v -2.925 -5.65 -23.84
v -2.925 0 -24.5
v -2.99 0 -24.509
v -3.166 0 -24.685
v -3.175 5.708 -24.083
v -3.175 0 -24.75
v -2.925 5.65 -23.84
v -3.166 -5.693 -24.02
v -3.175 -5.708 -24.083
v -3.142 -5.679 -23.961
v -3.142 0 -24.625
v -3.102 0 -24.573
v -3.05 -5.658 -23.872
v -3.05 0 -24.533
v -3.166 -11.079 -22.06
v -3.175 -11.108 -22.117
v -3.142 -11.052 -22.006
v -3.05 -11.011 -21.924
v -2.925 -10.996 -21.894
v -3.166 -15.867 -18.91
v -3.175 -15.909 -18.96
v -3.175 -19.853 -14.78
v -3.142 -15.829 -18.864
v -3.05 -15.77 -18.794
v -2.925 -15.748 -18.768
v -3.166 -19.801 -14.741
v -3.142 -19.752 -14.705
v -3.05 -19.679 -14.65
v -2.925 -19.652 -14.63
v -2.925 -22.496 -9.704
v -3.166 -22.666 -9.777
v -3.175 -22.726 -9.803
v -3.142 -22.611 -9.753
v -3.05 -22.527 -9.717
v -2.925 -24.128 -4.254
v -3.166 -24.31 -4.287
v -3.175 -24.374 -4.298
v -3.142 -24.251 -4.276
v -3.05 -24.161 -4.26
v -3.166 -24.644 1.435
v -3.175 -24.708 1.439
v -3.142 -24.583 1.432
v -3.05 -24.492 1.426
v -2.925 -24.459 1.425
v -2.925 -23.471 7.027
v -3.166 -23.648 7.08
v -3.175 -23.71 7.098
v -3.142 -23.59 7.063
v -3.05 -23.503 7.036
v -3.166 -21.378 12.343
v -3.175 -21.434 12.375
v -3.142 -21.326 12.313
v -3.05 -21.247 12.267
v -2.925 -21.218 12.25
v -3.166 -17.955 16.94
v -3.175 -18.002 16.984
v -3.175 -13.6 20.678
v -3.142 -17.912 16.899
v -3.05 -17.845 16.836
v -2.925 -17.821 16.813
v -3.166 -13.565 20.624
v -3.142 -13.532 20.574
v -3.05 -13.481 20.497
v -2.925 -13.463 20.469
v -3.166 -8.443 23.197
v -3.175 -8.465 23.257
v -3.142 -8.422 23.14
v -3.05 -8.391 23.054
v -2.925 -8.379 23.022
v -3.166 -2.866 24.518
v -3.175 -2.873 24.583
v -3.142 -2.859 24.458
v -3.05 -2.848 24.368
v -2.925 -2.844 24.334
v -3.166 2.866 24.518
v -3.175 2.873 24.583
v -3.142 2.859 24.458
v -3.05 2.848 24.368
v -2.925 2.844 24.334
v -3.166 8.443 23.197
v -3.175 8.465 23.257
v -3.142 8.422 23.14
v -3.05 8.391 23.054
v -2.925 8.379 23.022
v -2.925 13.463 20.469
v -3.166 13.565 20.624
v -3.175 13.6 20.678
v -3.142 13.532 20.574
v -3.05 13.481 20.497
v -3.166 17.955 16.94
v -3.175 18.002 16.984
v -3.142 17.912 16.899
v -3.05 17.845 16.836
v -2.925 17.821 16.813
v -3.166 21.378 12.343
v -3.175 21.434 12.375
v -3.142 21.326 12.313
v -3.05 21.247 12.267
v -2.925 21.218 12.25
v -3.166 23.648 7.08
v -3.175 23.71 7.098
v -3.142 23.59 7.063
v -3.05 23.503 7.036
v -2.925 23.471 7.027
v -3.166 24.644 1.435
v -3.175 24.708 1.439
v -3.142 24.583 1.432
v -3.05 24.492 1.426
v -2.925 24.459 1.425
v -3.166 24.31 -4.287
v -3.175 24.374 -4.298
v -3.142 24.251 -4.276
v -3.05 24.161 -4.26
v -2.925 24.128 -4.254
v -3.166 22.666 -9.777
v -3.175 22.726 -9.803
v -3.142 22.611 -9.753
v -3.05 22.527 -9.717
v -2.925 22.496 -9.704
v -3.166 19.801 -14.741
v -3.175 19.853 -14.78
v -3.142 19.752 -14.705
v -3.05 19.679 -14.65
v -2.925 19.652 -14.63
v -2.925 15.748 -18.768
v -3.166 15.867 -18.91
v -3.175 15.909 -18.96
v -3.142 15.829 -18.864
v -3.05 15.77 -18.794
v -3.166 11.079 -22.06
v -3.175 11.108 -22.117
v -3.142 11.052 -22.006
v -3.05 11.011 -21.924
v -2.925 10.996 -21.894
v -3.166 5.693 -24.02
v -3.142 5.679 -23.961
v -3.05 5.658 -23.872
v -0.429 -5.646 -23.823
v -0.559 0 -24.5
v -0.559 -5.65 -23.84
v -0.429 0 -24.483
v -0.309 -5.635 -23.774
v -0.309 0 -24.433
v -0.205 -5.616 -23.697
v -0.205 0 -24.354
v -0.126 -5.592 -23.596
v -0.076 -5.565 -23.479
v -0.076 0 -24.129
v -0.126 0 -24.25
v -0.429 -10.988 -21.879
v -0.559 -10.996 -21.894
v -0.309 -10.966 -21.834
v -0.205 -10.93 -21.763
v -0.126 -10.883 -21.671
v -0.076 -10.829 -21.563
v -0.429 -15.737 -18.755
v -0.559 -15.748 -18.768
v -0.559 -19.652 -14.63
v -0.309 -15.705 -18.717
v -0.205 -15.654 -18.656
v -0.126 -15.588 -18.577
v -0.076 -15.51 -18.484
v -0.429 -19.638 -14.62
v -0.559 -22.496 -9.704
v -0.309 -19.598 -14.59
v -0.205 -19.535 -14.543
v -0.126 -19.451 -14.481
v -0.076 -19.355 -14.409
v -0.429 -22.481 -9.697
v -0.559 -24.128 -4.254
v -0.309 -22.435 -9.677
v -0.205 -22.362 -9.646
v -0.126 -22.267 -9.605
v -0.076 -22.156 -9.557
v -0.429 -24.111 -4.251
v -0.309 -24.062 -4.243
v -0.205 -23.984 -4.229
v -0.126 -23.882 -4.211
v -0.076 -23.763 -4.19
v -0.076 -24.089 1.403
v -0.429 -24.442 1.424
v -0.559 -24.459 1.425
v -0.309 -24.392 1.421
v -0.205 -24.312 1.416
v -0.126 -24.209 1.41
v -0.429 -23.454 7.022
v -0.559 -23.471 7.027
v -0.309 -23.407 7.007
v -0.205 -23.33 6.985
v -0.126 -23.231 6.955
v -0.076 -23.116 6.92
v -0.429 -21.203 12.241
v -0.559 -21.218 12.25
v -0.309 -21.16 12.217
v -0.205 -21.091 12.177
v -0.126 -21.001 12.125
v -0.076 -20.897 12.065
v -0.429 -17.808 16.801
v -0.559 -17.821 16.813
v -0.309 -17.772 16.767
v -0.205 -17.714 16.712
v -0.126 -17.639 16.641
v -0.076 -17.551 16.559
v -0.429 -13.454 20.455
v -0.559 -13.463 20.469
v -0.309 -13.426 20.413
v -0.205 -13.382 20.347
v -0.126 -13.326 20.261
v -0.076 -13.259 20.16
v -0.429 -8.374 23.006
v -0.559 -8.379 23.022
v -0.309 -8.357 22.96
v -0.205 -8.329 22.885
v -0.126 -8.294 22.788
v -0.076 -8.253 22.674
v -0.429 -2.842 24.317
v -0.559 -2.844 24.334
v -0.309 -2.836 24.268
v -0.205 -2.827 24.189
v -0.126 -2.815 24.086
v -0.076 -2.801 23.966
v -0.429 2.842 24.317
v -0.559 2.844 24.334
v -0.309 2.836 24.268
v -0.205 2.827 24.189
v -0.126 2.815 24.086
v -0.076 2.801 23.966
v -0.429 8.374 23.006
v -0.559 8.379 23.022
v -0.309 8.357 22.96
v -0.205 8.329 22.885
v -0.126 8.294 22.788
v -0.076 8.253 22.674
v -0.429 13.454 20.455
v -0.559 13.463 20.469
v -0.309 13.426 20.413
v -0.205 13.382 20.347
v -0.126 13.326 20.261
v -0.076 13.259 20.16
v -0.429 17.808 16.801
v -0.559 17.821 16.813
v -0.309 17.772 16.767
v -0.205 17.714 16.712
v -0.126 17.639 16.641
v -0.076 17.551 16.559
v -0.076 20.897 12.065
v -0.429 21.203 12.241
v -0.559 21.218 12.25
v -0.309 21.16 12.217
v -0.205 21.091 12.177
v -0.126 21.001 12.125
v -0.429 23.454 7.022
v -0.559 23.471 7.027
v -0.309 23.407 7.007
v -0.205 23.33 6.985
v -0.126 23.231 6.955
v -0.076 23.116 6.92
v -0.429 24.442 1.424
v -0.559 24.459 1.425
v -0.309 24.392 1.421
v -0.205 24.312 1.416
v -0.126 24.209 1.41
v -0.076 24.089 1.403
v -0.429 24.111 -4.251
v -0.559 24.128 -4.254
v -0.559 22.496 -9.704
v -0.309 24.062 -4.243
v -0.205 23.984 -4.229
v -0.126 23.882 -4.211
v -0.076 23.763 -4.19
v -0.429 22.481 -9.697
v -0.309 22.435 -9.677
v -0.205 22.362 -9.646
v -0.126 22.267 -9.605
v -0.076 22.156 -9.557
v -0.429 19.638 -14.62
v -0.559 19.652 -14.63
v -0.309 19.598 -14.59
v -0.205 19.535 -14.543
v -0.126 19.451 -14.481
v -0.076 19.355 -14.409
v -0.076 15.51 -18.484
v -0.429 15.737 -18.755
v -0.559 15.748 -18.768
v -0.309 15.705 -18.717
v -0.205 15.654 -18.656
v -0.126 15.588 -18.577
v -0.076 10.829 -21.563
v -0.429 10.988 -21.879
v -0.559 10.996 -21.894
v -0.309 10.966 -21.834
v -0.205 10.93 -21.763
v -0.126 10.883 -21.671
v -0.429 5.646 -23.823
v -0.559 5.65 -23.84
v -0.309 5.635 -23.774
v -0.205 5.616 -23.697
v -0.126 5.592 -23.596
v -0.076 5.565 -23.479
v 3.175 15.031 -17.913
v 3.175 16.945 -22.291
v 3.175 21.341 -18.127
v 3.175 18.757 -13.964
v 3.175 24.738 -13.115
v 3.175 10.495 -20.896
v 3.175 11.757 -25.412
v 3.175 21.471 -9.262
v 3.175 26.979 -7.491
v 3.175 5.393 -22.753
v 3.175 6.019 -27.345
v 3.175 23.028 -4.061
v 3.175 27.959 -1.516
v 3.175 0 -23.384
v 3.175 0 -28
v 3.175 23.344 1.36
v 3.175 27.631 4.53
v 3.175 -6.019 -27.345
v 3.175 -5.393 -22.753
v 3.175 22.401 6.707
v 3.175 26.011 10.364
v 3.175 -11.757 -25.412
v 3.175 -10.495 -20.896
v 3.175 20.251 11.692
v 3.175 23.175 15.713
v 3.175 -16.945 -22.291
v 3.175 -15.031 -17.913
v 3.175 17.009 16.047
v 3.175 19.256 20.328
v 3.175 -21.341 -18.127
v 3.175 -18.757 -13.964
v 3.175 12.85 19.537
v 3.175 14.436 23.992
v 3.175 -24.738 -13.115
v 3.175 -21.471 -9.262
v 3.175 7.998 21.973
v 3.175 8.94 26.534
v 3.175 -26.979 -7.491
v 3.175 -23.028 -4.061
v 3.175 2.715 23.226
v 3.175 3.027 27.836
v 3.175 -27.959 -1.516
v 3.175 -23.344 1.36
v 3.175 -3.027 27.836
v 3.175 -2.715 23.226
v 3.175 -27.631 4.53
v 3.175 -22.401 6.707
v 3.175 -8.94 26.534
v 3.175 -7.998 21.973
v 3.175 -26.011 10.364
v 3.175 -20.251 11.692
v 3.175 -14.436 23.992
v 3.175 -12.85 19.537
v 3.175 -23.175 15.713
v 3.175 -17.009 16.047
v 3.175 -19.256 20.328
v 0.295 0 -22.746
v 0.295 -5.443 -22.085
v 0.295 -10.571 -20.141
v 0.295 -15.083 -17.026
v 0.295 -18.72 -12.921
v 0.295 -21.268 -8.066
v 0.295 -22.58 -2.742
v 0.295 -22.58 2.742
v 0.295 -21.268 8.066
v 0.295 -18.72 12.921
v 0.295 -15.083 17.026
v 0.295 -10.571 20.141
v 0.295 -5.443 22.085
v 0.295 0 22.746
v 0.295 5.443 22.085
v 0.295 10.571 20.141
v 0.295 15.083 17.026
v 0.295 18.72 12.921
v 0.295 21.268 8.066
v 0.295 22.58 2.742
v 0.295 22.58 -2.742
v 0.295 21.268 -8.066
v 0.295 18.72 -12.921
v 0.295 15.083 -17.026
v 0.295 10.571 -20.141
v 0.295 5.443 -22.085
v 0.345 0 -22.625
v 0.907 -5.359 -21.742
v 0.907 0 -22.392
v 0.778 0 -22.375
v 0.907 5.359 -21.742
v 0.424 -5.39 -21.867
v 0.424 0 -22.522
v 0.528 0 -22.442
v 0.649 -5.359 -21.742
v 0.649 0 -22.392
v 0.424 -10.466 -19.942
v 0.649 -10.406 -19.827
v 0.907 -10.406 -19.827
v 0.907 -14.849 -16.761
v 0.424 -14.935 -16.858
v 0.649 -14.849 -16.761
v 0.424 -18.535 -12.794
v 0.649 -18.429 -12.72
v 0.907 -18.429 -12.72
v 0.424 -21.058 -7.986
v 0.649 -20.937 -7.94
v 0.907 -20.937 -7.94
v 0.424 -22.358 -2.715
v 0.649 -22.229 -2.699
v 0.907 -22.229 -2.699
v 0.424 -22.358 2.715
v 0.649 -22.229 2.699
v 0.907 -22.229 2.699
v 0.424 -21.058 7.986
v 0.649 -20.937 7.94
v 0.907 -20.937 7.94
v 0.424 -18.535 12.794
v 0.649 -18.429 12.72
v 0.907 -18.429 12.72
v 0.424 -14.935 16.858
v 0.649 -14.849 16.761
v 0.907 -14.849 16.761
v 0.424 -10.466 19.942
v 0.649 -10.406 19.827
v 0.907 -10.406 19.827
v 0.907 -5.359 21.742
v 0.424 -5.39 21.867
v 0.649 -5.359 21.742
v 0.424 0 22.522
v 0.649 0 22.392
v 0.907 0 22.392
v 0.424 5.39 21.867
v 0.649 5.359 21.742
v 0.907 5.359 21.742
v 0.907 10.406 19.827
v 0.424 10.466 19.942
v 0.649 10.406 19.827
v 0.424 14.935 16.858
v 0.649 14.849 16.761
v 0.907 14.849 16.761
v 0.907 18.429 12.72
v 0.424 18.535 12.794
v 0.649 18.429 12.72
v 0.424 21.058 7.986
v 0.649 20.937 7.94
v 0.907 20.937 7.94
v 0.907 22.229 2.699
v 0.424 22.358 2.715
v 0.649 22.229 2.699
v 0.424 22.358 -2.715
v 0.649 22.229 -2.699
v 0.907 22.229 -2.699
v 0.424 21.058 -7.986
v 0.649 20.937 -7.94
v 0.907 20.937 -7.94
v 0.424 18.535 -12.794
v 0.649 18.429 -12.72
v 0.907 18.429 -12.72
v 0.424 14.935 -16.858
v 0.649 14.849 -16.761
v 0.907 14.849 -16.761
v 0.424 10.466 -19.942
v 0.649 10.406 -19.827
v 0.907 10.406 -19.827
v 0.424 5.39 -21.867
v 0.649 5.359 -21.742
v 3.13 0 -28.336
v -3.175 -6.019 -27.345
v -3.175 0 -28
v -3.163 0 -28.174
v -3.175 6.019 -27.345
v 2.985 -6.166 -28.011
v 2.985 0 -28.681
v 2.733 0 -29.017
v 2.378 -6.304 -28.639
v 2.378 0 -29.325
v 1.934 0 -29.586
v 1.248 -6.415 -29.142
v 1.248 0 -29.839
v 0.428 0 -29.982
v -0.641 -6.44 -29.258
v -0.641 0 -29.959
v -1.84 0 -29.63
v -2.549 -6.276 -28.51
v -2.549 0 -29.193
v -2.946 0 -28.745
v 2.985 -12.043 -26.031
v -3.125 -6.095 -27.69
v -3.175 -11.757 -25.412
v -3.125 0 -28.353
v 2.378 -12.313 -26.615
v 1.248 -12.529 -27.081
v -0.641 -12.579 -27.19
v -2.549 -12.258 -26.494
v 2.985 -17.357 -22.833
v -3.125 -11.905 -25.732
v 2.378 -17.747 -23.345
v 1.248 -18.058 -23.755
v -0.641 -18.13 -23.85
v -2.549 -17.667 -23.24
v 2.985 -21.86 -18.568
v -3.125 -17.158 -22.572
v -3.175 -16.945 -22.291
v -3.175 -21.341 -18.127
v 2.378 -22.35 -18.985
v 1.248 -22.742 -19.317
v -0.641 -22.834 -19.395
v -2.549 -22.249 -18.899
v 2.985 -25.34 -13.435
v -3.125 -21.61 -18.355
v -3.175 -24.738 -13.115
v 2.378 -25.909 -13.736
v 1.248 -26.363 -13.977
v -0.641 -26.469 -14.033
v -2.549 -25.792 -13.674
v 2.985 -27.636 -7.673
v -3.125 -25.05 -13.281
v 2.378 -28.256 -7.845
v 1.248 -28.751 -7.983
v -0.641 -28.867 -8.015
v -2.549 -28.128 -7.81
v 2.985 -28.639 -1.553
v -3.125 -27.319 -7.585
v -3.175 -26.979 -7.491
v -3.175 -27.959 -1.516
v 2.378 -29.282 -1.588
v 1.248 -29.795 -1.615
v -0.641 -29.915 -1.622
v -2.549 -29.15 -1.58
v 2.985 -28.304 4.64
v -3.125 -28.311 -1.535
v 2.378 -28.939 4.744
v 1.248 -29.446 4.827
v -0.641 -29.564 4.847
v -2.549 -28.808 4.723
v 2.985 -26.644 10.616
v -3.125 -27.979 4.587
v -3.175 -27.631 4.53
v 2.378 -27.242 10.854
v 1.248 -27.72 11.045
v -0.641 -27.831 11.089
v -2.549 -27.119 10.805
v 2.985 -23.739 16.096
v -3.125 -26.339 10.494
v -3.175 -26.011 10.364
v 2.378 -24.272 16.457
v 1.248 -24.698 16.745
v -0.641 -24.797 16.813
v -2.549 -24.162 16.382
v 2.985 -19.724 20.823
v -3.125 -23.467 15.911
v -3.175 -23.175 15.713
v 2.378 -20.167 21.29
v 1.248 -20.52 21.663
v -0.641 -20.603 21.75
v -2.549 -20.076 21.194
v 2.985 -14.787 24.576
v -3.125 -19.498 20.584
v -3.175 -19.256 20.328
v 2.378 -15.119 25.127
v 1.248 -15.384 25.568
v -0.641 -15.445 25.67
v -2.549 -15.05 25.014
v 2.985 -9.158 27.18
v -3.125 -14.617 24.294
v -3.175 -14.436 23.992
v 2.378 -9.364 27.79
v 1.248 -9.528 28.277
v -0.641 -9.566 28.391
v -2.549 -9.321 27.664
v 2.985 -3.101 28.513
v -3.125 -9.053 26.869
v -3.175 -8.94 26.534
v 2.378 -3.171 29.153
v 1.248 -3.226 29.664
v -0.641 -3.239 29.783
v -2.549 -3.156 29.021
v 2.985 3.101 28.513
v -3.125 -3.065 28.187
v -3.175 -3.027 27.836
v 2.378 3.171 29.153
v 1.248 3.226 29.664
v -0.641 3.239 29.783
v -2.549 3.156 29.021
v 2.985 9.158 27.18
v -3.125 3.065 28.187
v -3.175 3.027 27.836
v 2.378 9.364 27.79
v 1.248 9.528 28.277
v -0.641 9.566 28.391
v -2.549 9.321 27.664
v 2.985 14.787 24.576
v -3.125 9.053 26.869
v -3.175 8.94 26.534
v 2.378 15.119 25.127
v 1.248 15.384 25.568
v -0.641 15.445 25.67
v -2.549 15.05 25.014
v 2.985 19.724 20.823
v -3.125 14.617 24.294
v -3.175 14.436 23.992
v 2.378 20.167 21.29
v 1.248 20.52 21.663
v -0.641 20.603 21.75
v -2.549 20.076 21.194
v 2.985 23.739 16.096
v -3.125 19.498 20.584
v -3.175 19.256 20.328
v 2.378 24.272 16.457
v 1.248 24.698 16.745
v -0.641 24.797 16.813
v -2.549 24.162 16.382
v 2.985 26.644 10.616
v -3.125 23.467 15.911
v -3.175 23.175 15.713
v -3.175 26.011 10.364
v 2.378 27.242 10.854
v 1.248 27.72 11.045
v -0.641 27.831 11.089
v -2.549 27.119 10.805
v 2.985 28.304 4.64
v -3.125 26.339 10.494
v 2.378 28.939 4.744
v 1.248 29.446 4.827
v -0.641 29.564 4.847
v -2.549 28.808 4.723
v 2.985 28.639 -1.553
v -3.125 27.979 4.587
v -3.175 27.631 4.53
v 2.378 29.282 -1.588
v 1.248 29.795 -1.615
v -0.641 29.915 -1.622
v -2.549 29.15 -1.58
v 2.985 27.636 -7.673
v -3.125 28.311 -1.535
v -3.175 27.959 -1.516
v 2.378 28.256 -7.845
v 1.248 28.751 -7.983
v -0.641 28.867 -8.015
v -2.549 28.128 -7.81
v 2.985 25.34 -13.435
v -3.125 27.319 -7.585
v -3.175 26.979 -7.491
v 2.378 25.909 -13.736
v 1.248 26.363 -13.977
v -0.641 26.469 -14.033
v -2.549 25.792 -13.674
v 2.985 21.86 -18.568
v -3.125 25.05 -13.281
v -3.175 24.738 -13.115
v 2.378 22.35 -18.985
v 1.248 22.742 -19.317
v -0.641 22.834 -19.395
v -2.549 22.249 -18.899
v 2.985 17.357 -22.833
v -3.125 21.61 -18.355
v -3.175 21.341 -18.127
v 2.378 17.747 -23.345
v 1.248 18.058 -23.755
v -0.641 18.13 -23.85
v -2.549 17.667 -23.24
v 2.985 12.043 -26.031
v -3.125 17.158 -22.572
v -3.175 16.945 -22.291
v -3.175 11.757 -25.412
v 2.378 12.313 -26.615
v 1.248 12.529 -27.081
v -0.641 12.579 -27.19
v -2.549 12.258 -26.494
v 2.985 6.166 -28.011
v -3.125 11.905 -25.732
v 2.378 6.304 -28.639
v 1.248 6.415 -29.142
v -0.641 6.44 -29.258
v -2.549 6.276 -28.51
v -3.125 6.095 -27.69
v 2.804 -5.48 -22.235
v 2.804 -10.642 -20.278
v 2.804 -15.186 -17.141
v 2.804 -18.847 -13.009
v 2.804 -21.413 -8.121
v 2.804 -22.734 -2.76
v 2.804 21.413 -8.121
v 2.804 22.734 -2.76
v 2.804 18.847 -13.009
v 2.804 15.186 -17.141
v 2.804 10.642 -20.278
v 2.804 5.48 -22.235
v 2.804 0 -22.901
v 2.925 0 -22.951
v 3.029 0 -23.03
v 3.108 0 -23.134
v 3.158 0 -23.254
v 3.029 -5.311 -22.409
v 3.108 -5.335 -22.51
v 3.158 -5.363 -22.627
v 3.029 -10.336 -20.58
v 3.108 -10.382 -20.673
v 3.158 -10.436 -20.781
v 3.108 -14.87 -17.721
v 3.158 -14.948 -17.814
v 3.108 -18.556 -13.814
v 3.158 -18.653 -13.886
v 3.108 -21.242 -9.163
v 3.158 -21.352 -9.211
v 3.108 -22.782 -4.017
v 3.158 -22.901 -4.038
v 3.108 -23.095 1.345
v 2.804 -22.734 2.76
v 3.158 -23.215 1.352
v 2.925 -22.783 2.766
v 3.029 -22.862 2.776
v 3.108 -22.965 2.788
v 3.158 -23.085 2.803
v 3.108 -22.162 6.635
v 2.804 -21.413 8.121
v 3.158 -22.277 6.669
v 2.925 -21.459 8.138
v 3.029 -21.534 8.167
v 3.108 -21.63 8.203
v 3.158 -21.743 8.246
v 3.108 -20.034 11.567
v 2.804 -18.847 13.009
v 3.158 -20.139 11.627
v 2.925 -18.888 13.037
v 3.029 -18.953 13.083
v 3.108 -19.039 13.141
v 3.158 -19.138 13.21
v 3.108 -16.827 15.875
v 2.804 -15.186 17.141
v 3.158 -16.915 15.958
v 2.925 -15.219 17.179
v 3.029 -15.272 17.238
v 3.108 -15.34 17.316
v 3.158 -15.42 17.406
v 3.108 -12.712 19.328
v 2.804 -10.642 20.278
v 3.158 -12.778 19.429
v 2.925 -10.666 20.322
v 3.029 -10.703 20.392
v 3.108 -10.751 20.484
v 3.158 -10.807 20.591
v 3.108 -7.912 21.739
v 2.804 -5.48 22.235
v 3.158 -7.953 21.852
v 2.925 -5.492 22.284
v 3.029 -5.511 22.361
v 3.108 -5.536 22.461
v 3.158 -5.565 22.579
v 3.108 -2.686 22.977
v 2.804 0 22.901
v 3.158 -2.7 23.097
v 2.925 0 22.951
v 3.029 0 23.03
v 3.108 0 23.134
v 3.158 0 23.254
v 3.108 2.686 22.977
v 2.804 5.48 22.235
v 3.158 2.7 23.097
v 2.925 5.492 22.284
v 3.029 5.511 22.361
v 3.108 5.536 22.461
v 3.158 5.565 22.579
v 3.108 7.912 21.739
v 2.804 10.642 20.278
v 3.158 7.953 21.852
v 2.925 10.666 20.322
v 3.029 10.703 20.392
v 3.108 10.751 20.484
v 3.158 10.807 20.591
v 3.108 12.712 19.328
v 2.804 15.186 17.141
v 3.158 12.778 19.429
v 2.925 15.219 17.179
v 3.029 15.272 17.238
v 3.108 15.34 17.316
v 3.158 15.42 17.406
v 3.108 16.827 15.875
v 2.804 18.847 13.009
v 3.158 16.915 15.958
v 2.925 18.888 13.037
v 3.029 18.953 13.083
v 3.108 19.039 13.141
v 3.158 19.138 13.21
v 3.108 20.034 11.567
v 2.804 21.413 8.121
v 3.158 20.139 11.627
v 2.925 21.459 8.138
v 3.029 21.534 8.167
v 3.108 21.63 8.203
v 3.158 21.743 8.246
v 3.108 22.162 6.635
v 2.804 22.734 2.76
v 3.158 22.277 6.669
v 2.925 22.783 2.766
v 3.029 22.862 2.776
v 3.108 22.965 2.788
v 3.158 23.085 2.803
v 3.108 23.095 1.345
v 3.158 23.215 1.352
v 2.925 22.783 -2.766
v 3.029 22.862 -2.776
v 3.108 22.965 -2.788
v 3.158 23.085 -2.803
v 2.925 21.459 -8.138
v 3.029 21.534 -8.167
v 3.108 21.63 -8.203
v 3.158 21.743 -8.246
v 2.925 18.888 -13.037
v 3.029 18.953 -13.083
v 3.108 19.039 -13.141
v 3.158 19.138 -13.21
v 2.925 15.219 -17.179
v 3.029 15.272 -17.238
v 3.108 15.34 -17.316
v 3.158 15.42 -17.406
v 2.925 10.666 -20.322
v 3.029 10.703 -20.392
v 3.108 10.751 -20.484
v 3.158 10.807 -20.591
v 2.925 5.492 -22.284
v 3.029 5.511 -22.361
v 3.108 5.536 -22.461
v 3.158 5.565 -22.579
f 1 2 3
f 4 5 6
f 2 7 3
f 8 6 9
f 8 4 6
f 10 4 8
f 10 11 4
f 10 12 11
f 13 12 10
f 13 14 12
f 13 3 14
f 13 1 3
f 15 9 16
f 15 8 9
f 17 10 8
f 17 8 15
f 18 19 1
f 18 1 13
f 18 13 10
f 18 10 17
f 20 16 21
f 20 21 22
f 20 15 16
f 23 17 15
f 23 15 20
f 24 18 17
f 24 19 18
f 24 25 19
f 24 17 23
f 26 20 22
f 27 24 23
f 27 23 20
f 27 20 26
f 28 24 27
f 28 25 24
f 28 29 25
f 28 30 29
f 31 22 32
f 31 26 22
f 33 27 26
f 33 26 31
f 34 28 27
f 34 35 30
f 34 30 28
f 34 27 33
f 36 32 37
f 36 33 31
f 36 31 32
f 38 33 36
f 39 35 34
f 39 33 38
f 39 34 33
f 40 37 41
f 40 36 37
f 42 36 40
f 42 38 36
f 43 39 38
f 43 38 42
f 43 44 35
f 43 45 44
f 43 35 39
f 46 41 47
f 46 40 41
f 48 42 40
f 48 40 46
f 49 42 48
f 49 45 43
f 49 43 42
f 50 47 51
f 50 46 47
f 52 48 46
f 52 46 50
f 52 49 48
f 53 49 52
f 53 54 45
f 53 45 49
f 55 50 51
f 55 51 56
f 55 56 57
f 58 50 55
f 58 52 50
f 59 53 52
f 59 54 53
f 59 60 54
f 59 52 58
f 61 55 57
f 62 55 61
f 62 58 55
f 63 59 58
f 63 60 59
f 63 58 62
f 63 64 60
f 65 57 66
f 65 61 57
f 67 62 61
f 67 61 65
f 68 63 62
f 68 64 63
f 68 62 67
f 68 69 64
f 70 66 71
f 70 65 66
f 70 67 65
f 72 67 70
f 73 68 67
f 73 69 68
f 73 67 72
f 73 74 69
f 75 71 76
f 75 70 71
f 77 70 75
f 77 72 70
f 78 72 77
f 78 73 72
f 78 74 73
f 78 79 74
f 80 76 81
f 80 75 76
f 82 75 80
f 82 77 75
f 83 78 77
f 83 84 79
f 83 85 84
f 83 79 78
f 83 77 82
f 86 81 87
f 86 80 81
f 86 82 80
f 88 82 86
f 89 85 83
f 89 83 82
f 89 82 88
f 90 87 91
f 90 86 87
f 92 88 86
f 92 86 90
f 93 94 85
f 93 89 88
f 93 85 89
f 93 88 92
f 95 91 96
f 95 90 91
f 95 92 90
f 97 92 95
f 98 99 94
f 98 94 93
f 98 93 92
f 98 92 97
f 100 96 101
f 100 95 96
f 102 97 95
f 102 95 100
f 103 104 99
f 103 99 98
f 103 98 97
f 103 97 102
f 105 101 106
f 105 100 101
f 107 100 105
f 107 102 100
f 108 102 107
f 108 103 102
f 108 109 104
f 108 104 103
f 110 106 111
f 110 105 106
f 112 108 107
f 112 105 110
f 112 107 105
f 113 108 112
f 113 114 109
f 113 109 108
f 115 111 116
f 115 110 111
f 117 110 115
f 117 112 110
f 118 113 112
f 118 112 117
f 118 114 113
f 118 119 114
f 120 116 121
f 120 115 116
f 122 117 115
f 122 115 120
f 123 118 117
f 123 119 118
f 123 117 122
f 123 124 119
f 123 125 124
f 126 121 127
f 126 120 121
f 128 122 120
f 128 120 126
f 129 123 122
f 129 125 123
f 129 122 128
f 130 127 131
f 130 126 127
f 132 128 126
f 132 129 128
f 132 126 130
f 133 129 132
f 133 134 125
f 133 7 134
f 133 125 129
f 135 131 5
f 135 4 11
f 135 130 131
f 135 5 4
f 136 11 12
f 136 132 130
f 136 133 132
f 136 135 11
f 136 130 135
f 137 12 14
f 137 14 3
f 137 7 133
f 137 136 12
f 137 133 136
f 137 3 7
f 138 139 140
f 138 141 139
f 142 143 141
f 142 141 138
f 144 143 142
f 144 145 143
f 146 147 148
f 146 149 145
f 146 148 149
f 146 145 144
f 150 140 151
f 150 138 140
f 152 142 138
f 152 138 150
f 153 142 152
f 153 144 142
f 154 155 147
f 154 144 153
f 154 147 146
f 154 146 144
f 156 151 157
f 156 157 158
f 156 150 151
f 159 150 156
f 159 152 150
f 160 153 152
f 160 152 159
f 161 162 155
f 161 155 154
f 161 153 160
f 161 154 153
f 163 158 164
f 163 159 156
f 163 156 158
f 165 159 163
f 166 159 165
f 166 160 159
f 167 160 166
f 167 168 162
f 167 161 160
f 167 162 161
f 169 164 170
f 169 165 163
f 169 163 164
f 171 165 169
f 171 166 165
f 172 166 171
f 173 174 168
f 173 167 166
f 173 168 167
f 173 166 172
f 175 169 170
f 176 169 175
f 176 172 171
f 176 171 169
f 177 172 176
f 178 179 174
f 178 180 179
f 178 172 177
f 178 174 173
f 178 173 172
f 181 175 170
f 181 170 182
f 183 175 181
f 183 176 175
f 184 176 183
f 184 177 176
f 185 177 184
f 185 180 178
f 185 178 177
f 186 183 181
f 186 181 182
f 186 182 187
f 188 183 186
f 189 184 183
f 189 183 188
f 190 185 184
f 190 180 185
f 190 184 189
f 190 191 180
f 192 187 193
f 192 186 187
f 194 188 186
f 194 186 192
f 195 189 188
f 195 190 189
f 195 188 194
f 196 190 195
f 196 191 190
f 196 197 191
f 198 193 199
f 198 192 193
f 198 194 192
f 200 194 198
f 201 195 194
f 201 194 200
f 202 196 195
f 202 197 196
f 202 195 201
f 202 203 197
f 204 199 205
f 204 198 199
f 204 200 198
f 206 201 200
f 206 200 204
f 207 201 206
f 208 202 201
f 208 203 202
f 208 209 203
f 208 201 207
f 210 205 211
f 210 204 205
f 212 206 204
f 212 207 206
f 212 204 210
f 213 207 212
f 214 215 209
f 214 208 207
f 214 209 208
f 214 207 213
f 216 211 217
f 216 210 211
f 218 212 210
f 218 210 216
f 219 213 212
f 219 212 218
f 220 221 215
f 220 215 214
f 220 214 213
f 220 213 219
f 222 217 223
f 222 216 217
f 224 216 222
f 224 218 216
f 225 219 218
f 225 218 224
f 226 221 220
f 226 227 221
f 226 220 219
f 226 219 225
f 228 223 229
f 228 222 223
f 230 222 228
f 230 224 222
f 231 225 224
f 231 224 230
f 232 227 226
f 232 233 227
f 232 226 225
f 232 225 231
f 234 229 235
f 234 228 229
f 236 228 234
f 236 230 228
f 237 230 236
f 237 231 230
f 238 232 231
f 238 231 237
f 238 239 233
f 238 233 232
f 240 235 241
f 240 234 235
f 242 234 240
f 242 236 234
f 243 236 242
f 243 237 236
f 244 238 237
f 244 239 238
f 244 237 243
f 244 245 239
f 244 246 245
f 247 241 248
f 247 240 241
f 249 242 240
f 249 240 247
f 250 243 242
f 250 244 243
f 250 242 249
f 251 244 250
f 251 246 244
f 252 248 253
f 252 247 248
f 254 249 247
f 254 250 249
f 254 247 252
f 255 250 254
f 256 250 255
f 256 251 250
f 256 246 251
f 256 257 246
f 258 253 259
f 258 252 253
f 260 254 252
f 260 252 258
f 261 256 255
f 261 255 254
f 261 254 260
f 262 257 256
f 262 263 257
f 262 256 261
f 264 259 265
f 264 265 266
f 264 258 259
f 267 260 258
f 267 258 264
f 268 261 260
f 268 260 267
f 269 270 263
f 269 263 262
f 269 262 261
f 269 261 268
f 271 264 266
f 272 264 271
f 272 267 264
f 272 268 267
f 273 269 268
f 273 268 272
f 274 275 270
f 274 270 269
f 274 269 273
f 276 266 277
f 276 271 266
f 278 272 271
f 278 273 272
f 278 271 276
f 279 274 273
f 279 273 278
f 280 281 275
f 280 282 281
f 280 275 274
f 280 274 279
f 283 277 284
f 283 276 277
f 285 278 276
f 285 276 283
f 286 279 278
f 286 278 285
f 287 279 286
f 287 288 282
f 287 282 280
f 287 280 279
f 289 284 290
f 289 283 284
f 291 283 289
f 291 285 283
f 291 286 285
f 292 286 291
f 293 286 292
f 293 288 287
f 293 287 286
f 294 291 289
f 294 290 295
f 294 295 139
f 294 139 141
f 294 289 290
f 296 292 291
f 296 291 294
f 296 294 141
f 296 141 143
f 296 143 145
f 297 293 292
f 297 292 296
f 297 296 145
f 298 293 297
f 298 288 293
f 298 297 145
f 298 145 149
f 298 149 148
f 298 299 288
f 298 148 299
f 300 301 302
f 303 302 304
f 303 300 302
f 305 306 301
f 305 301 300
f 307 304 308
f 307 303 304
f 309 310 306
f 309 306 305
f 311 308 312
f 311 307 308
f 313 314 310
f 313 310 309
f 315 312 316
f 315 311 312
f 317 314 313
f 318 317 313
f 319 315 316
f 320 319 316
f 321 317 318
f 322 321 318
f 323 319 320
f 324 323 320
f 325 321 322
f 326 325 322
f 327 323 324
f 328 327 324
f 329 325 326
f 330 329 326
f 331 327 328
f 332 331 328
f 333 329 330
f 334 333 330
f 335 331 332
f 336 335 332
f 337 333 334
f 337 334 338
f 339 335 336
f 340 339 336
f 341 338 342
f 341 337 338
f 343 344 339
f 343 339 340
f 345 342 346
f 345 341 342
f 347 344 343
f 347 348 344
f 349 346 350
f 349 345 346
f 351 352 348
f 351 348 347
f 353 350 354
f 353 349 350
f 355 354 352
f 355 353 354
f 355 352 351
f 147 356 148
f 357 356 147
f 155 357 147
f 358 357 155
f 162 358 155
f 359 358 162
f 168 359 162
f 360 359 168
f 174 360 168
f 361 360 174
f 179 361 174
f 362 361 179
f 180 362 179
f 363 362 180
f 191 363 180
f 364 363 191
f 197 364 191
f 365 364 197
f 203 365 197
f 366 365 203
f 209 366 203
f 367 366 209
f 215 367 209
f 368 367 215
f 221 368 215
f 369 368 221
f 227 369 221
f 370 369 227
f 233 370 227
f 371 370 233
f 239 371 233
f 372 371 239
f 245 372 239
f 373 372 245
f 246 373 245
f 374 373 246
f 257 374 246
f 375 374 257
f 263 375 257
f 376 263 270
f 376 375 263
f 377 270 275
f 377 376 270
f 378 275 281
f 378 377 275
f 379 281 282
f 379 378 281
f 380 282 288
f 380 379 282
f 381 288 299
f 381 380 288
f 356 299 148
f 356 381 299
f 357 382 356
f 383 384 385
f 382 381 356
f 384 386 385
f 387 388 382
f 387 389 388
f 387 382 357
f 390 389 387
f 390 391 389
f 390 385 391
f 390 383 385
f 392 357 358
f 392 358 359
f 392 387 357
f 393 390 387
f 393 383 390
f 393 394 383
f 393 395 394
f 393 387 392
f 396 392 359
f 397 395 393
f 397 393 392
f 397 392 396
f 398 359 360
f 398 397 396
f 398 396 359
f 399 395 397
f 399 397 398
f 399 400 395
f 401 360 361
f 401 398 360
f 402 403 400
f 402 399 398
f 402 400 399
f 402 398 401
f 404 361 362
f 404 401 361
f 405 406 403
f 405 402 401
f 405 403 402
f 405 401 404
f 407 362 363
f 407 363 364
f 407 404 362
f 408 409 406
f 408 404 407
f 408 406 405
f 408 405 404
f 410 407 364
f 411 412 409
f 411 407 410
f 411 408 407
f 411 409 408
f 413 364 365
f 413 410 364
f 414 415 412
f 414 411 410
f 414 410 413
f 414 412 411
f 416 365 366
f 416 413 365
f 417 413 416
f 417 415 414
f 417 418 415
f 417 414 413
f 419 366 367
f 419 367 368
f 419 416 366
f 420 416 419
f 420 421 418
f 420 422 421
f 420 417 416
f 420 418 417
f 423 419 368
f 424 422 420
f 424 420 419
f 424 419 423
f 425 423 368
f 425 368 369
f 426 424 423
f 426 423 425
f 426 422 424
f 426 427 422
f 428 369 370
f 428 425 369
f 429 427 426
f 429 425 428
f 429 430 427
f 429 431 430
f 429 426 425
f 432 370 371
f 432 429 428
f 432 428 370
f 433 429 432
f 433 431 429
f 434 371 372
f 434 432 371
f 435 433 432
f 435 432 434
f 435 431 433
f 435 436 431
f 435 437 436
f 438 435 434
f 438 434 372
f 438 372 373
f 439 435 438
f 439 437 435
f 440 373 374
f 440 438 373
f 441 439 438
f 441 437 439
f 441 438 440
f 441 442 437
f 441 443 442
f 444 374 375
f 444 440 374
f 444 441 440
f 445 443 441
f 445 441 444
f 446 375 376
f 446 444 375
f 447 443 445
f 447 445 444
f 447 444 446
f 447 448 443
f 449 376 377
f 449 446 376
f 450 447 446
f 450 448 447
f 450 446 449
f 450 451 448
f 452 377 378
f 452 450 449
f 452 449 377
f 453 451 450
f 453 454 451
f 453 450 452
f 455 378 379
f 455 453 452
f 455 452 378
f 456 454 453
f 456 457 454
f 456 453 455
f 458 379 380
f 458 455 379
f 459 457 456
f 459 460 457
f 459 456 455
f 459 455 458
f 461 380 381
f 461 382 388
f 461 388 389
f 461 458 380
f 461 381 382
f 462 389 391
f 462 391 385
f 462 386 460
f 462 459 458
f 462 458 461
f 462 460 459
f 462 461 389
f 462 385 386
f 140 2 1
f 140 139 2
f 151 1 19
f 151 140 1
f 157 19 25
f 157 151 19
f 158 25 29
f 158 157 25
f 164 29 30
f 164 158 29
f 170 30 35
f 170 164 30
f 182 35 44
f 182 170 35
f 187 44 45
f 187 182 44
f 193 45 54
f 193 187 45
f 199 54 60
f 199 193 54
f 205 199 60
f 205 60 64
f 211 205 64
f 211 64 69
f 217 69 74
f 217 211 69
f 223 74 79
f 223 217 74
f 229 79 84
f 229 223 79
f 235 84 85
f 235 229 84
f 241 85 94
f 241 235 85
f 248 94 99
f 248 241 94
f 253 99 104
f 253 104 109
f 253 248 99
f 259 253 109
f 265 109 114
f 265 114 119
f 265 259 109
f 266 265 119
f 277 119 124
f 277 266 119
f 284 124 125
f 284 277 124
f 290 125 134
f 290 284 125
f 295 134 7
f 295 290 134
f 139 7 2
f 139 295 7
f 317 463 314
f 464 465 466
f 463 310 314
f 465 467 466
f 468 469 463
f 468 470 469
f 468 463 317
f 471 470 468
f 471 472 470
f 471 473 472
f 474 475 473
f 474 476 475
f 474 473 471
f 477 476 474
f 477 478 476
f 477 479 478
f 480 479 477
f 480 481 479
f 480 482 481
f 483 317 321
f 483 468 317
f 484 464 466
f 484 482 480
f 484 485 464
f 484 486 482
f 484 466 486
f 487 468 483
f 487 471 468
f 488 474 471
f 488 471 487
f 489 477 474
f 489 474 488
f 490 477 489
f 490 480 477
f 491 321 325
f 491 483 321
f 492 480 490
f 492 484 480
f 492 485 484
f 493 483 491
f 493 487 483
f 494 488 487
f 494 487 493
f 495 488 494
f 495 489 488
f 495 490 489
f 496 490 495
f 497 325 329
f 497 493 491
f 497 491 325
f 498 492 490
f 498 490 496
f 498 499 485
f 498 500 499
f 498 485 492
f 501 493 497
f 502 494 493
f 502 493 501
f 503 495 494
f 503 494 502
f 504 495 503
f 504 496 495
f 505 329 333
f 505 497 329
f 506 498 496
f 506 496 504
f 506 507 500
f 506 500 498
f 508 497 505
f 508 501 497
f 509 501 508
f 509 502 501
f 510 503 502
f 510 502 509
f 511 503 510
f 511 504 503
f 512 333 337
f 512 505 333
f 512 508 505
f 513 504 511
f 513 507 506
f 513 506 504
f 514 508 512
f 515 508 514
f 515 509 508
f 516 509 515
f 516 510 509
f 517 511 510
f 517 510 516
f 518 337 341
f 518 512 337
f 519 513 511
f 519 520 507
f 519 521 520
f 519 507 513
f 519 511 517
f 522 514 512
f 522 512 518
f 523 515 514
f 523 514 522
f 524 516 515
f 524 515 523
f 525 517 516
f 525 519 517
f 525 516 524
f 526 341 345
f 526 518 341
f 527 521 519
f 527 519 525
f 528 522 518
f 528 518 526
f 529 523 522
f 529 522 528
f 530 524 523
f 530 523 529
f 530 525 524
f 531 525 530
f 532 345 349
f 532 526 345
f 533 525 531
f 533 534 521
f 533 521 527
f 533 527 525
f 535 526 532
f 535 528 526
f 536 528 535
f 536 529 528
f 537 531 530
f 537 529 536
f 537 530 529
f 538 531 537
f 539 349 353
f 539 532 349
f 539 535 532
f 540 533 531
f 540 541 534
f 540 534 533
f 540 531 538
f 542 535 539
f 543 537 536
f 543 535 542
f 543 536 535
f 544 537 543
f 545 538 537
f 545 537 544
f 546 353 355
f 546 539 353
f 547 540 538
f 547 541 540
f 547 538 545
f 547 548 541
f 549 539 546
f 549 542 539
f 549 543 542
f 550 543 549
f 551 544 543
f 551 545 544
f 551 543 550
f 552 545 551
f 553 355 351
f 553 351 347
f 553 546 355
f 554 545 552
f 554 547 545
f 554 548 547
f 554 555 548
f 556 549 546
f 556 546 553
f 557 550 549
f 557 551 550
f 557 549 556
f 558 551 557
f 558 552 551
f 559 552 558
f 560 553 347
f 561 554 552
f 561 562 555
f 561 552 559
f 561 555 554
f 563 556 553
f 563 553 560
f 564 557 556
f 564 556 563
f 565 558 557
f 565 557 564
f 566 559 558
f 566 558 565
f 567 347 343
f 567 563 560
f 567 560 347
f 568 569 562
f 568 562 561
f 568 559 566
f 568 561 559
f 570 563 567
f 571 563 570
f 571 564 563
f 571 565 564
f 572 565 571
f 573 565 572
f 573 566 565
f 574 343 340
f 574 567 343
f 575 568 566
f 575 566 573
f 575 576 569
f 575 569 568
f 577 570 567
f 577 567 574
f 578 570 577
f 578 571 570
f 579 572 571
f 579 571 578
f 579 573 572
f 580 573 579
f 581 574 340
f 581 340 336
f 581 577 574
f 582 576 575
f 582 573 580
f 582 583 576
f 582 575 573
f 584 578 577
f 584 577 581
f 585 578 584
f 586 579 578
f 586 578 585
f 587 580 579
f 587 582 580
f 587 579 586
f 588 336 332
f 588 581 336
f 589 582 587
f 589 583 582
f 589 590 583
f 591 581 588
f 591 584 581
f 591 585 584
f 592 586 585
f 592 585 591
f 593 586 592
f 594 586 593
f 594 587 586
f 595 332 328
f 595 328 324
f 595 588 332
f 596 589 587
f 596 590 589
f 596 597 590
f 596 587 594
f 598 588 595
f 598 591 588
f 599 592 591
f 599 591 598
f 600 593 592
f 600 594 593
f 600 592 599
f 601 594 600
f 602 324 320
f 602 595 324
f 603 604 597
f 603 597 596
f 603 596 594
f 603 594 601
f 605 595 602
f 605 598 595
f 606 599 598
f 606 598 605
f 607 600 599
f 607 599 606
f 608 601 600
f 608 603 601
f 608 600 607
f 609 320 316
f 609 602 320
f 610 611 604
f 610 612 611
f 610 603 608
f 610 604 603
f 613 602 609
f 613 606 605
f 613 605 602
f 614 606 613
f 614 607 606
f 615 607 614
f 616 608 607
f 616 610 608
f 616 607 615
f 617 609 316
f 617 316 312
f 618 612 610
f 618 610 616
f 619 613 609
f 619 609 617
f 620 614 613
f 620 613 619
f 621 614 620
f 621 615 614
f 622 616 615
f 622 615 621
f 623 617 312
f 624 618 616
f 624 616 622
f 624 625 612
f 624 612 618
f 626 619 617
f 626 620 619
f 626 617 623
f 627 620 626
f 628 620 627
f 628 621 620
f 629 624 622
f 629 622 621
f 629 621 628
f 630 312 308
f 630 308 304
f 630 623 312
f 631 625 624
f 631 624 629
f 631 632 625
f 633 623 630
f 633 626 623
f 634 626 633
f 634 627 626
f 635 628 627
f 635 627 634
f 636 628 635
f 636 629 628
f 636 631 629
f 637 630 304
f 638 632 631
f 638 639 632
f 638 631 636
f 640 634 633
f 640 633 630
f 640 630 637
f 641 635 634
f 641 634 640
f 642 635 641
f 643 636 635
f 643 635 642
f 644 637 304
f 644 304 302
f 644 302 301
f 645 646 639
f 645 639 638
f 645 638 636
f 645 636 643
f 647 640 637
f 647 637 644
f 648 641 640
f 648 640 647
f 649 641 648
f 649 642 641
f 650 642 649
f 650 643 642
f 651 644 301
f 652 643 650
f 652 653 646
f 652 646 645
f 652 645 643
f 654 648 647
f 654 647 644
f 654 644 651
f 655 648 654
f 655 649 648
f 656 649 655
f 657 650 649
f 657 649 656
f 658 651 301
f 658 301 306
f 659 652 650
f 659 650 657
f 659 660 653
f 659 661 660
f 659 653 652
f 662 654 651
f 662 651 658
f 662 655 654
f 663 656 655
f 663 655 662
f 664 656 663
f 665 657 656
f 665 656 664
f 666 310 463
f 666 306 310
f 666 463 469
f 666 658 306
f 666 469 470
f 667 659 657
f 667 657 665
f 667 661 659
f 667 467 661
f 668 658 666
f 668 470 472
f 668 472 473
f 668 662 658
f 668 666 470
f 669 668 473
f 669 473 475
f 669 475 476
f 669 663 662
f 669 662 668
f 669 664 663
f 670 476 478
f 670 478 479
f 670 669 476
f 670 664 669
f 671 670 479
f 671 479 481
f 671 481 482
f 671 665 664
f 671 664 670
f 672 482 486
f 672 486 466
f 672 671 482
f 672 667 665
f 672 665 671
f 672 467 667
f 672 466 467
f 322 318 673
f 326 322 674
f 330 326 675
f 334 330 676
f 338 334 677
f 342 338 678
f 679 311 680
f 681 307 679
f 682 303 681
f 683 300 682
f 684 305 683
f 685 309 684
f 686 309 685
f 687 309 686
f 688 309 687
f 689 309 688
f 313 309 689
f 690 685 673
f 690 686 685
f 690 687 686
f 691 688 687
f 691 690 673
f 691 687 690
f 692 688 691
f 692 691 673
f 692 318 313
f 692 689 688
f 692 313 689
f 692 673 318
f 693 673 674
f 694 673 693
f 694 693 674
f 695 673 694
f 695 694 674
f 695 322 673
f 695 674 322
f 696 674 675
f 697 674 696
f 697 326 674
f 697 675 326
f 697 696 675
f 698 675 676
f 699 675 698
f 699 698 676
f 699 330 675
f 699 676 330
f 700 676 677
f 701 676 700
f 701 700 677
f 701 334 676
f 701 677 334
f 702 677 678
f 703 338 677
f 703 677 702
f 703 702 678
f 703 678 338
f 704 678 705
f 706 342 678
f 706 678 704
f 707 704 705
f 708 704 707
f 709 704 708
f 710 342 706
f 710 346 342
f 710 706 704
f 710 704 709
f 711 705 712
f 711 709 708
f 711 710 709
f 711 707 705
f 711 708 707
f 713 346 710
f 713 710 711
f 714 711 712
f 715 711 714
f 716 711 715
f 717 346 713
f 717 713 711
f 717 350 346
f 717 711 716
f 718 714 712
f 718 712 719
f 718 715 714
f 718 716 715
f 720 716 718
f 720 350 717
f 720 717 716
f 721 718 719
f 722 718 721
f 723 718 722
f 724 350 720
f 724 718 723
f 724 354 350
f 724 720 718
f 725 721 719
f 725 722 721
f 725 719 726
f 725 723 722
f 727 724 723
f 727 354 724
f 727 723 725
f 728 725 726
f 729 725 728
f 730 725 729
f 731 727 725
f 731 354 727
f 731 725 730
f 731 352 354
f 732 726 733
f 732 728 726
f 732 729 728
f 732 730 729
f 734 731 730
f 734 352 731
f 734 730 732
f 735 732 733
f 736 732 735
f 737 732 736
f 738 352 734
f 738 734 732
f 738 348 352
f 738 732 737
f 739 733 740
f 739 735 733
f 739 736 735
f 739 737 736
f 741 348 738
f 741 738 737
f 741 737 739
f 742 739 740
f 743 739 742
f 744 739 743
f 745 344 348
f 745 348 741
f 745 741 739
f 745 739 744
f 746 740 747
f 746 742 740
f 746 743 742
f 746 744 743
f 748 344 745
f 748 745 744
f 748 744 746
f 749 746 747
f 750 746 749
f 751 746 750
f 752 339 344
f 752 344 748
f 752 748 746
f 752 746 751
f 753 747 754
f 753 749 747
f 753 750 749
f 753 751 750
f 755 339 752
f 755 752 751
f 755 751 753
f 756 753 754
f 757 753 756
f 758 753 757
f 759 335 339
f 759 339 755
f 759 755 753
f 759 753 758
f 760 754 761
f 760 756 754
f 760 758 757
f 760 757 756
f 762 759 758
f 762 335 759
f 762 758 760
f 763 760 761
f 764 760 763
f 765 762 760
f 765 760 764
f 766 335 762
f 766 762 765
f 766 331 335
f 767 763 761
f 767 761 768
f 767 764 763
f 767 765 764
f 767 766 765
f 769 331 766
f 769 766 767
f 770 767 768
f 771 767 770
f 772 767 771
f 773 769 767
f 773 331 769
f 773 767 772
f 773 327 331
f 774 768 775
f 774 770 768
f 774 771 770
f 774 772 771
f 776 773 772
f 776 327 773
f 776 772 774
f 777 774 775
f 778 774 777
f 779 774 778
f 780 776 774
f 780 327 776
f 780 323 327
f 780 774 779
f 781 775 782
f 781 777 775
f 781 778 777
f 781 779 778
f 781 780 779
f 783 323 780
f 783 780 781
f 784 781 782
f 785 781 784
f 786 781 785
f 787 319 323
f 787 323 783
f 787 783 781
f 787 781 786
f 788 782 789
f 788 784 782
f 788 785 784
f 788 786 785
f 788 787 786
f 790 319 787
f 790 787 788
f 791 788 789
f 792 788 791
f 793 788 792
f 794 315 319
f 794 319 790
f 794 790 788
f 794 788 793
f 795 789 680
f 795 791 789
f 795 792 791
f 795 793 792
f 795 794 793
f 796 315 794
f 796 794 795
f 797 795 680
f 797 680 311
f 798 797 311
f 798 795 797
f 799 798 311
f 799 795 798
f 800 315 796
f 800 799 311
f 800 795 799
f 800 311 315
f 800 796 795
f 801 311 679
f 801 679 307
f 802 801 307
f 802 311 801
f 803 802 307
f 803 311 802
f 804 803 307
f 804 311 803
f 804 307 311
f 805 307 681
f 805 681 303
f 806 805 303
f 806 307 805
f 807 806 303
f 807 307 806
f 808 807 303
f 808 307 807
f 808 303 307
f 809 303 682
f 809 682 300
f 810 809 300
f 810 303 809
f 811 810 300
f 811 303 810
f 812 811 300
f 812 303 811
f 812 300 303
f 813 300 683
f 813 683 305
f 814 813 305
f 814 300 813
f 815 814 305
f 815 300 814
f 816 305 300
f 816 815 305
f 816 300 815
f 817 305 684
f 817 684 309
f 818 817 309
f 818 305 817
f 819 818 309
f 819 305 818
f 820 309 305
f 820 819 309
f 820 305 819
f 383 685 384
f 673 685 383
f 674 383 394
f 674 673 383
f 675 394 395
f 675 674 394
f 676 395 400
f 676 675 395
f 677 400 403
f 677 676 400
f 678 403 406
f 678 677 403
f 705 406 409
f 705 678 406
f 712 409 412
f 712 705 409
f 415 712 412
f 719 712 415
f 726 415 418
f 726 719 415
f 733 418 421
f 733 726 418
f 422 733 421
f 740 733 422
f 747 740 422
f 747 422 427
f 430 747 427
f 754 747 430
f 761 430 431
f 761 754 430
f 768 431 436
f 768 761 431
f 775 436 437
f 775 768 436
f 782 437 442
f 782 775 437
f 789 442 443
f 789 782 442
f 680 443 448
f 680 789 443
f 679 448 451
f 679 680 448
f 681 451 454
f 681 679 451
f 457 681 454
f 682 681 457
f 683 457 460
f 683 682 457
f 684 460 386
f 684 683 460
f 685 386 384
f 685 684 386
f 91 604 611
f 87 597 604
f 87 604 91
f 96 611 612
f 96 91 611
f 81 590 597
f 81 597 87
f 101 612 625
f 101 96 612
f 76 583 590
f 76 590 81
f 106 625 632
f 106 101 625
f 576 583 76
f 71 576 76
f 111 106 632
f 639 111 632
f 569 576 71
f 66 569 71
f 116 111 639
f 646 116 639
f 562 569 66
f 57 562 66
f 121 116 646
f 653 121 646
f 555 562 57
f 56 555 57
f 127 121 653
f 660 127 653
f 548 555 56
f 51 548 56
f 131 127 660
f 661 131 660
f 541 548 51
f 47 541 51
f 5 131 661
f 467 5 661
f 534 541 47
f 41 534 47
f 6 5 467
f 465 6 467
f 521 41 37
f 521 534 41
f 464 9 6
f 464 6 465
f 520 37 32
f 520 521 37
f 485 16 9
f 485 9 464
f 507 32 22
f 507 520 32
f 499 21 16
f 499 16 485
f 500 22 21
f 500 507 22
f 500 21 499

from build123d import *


with BuildPart() as part:
    # Sketch1 → Revolve1 (revolve)
    with BuildSketch(Plane(origin=(0, 0, 0), x_dir=(1, 0, 0), z_dir=(0, 1, 0))):
        with BuildLine():
            Line((-3.175, 28), (-3.175, 24.75))
            ThreePointArc((-3.175, 24.75), (-3.101776695, 24.573223305), (-2.925, 24.5))
            Line((-2.925, 24.5), (-0.558663494, 24.5))
            ThreePointArc((-0.558663494, 24.5), (-0.254282779, 24.39667667), (-0.075700581, 24.129409523))
            Line((-0.075700581, 24.129409523), (0.294997926, 22.74594386))
            ThreePointArc((0.294997926, 22.74594386), (0.527960839, 22.442340681), (0.907370362, 22.39239047))
            Line((0.907370362, 22.39239047), (2.804409523, 22.900700581))
            ThreePointArc((2.804409523, 22.900700581), (3.07167667, 23.079282779), (3.175, 23.383663494))
            Line((3.175, 23.383663494), (3.175, 28))
            add(Edge.make_bspline(
                [(3.175, 28), (3.175, 30), (0, 30), (-3.175, 30), (-3.175, 28)],
                knots=[0, 0, 0, 1.570796327, 1.570796327, 3.141592654, 3.141592654, 3.141592654], degree=2, weights=[1, 0.707106781, 1, 0.707106781, 1]))
        make_face()
    revolve(axis=Axis((88.99, 0, 0), (-1, 0, 0)))


solid = part.part
